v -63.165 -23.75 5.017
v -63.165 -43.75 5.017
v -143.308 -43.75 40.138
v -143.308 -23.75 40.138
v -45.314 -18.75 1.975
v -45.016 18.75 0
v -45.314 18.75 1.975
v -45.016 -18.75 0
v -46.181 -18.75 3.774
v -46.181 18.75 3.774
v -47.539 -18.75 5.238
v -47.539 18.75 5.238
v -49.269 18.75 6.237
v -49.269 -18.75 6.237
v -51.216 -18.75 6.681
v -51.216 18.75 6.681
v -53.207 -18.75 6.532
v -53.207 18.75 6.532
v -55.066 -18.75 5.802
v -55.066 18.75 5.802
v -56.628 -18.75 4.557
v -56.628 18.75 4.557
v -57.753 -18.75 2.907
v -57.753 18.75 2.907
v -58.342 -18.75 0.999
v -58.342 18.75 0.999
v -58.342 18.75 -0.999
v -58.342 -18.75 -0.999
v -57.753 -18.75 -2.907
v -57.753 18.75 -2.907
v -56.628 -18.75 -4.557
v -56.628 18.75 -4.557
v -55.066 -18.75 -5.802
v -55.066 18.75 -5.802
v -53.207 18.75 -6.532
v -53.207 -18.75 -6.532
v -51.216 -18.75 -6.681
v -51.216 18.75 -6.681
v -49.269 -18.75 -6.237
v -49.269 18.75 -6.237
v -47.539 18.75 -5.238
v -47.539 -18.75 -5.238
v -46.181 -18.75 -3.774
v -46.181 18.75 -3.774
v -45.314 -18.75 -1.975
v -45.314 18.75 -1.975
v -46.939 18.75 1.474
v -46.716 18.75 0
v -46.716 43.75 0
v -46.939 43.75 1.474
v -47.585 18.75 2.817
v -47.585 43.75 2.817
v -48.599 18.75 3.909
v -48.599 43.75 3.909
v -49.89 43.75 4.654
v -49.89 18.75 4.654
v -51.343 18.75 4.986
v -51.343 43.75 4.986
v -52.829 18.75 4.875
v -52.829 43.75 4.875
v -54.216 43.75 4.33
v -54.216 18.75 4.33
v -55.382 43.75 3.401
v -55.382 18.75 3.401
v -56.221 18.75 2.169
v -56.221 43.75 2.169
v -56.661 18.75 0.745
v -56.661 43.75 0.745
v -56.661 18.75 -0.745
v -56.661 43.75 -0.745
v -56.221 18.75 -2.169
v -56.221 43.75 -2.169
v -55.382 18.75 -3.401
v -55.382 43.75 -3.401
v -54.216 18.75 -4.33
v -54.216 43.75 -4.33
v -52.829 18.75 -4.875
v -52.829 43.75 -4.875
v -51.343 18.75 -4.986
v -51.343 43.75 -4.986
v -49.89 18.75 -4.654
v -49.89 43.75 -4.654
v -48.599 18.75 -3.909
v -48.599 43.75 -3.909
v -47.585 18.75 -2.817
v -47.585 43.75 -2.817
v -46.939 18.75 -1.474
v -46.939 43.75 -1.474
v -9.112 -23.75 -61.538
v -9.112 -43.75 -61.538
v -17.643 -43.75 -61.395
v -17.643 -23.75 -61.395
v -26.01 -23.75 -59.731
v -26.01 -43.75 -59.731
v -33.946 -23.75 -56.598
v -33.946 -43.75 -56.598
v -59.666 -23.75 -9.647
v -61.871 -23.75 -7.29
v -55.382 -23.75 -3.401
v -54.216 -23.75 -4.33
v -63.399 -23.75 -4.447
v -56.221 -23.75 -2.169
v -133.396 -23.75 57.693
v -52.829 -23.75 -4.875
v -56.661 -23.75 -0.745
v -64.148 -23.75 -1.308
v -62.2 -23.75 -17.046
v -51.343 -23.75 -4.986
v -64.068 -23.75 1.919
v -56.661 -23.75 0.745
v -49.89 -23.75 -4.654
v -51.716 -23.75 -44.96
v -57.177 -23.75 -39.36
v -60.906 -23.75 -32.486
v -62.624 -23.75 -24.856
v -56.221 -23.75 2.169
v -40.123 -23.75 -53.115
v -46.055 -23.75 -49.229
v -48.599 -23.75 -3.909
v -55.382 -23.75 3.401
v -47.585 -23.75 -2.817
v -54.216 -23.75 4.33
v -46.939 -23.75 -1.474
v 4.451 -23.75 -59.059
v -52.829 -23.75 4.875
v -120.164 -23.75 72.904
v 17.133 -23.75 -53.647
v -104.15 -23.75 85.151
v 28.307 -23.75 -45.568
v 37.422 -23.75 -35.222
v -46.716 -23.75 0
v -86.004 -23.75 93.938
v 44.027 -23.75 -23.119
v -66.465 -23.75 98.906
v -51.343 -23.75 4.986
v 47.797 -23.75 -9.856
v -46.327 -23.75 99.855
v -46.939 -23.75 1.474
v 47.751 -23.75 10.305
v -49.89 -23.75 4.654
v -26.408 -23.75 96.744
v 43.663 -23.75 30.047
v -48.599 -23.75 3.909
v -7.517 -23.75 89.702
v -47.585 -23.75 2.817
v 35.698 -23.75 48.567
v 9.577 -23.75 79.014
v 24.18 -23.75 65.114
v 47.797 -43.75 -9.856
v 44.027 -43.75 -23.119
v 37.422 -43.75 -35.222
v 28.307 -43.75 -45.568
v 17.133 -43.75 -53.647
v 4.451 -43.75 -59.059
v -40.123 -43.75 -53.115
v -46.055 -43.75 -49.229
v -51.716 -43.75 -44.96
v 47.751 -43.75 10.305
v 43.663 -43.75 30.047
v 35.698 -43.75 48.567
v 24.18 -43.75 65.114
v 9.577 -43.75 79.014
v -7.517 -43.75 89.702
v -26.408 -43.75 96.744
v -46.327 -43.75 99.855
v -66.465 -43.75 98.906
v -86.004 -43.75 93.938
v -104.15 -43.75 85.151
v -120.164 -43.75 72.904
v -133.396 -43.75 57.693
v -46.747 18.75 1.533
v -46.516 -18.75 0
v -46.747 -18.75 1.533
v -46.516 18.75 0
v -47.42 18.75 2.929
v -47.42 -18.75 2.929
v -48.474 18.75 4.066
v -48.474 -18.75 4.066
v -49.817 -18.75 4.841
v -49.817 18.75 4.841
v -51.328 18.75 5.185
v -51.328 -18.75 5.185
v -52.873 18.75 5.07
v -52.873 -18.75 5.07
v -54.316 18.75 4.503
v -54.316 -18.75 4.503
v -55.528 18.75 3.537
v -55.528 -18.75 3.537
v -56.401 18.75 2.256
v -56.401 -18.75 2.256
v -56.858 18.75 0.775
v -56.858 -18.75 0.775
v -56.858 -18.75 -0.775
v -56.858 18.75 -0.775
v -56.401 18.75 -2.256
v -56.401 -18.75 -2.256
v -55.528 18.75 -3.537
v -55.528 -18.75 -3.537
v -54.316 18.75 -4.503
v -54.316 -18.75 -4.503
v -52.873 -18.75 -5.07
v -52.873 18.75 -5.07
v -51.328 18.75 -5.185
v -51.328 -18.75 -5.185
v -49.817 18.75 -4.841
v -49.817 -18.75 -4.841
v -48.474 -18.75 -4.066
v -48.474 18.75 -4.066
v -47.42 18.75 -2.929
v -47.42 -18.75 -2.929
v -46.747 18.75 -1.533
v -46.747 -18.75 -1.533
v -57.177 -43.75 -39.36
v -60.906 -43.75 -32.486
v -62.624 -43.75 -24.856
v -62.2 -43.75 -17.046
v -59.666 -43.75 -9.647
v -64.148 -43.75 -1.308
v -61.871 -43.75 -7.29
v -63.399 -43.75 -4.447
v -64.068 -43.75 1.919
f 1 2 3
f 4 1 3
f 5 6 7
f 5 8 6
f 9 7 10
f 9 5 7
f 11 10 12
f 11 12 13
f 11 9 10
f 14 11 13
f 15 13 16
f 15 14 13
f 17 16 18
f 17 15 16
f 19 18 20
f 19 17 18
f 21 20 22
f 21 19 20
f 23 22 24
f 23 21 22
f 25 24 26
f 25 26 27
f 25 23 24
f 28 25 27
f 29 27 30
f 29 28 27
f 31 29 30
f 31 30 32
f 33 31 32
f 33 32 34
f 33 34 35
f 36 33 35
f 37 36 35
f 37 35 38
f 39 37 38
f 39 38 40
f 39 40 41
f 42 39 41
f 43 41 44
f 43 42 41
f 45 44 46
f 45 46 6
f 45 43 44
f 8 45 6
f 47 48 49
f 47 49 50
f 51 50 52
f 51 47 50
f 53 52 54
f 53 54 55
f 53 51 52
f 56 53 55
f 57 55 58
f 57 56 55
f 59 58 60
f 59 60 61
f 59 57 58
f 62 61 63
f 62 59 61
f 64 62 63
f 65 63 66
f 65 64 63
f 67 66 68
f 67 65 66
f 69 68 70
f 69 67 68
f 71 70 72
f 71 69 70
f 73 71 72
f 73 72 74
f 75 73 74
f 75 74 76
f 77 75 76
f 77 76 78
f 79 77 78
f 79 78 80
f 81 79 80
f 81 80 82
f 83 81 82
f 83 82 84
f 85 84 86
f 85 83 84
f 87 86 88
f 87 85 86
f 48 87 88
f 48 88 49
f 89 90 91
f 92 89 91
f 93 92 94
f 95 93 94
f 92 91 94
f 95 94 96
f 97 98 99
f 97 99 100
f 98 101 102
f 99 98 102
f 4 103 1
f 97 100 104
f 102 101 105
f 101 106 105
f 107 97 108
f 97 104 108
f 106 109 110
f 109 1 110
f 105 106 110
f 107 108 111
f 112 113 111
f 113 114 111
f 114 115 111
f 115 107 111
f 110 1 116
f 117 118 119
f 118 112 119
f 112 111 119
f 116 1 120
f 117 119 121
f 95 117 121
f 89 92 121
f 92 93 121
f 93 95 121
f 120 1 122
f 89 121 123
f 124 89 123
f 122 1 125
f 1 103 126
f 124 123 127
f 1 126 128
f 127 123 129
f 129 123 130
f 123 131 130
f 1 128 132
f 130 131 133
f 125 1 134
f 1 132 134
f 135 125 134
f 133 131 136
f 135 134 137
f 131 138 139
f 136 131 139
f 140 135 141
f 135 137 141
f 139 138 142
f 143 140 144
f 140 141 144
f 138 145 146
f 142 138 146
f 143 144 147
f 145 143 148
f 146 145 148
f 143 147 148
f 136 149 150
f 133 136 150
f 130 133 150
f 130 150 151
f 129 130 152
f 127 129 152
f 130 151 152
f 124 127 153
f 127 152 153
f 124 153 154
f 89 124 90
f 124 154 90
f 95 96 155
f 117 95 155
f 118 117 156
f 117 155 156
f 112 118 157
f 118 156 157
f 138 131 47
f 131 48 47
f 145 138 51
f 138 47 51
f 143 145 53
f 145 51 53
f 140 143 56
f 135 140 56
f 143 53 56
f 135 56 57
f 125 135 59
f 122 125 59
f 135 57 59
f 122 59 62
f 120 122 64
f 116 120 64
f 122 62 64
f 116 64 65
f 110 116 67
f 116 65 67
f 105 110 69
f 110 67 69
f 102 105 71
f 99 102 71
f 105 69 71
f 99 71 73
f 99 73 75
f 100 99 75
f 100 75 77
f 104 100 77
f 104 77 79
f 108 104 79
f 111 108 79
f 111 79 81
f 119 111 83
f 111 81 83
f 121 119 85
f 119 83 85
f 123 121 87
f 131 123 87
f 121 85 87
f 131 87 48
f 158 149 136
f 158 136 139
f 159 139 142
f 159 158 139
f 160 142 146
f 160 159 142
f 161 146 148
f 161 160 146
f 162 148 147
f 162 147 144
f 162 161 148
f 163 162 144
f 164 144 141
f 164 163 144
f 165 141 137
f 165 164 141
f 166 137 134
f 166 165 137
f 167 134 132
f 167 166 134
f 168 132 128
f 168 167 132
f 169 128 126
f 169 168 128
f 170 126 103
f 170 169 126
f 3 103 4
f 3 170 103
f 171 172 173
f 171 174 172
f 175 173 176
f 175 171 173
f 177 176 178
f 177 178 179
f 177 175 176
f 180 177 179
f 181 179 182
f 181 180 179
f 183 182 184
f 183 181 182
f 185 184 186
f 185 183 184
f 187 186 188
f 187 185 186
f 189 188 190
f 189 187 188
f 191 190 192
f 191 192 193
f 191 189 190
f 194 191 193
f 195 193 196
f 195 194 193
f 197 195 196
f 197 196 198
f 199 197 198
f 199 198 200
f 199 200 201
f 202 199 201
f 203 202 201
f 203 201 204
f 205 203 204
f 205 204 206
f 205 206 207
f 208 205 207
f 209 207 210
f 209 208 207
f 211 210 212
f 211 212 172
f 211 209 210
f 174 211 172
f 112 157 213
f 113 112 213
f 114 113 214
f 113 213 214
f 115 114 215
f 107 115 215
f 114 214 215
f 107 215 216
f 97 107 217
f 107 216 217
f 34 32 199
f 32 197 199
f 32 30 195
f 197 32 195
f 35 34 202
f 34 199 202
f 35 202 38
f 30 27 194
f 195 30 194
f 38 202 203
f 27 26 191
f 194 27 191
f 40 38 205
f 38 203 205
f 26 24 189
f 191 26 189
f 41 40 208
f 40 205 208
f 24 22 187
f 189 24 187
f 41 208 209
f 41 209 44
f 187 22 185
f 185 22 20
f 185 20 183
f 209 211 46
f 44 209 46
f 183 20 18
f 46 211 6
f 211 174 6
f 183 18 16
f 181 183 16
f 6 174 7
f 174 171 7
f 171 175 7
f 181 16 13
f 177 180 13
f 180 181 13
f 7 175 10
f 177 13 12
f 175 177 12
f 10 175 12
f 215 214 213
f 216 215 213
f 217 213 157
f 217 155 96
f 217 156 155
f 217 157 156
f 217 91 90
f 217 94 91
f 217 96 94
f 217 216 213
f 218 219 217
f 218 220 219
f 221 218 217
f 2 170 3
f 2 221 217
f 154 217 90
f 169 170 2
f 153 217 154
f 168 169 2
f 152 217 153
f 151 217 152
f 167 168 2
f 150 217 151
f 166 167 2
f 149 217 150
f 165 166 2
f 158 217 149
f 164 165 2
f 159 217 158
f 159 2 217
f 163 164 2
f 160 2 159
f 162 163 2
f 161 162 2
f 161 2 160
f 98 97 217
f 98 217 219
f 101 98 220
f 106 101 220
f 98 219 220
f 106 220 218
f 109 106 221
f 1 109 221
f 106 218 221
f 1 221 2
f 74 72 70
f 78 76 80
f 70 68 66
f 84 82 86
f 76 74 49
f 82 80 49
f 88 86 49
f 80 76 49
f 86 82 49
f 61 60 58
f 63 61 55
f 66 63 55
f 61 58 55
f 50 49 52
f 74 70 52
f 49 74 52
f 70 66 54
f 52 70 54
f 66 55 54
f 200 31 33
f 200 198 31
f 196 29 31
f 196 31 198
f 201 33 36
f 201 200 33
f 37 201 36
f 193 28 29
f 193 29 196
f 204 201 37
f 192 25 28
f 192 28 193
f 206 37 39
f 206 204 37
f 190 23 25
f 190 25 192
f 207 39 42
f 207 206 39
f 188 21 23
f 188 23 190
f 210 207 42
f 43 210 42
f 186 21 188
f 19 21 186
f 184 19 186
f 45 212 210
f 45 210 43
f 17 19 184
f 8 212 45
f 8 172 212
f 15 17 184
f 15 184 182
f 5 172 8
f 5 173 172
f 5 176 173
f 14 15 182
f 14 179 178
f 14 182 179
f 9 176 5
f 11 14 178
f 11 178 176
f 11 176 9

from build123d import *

# Parameters (mm, degrees)
F0_R     = 5
F1_DEPTH = 18.75
F0_R_2   = 6.7
F0_R_3   = 5.2
F2_DEPTH = 25
F3_DEPTH = 25
F4_R     = 100
F4_R_2   = 5
F5_DEPTH = 20
F7_DEPTH = 20


with BuildPart() as f1:
    # F0 (on Front) → F1 (new body, symmetric)
    with BuildSketch(Plane.XZ):
        with Locations((-51.7163668807, 0)):
            Circle(F0_R)
    extrude(amount=F1_DEPTH, both=True)

    # F2 (add): a face of the model
    f2_faces = [f1.faces().sort_by_distance(p)[0] for p in [
        (-51.7163668807, -18.75, 0),
    ]]
    extrude(f2_faces, amount=F2_DEPTH)

    # F3 (add): a face of the model
    f3_faces = [f1.faces().sort_by_distance(p)[0] for p in [
        (-51.7163668807, 18.75, 0),
    ]]
    extrude(f3_faces, amount=F3_DEPTH)

    # F4 (on face) → F5 (join)
    with BuildSketch(Plane.XZ.offset(43.75)):
        with Locations((-51.7163668807, 0)):
            Circle(F4_R)
        with Locations((-51.7163668807, 0)):
            Circle(F4_R_2, mode=Mode.SUBTRACT)
    extrude(amount=-F5_DEPTH)

    # F6 (on face) → F7 (cut)
    with BuildSketch(Plane.XZ.offset(43.75)):
        with BuildLine():
            ThreePointArc((-59.6655482209, -9.6467878602), (-63.8748890556, -2.9017819565), (-63.1652882908, 5.0171903038))
            Line((-63.1652882908, 5.0171903038), (-143.3077381617, 40.1375224305))
            ThreePointArc((-143.3077381617, 40.1375224305), (-106.8702714682, -83.414907593), (21.0834731349, -68.5578827977))
            ThreePointArc((21.0834731349, -68.5578827977), (-7.232450883, -66.264251094), (-33.946054473, -56.598037636))
            ThreePointArc((-33.946054473, -56.598037636), (-43.1208155263, -51.2211789669), (-51.7163668807, -44.9599213898))
            ThreePointArc((-51.7163668807, -44.9599213898), (-62.0284567829, -28.7299606949), (-59.6655482209, -9.6467878602))
        make_face()
        with BuildLine():
            ThreePointArc((-33.946054473, -56.598037636), (-7.232450883, -66.264251094), (21.0834731349, -68.5578827977))
            ThreePointArc((21.0834731349, -68.5578827977), (39.3024442467, -41.4195125631), (47.7967649051, -9.8557902871))
            ThreePointArc((47.7967649051, -9.8557902871), (28.3071212669, -45.568429884), (-9.1123972088, -61.5377277136))
            ThreePointArc((-9.1123972088, -61.5377277136), (-21.8639782121, -60.7508072156), (-33.946054473, -56.598037636))
        make_face()
    extrude(amount=-F7_DEPTH, mode=Mode.SUBTRACT)


with BuildPart() as f1b:
    # F0 (on Front) → F1, piece 2 (new body, symmetric)
    with BuildSketch(Plane.XZ):
        with Locations((-51.7163668807, 0)):
            Circle(F0_R_2)
        with Locations((-51.7163668807, 0)):
            Circle(F0_R_3, mode=Mode.SUBTRACT)
    extrude(amount=F1_DEPTH, both=True)


solid = Compound([f1.part, f1b.part])
